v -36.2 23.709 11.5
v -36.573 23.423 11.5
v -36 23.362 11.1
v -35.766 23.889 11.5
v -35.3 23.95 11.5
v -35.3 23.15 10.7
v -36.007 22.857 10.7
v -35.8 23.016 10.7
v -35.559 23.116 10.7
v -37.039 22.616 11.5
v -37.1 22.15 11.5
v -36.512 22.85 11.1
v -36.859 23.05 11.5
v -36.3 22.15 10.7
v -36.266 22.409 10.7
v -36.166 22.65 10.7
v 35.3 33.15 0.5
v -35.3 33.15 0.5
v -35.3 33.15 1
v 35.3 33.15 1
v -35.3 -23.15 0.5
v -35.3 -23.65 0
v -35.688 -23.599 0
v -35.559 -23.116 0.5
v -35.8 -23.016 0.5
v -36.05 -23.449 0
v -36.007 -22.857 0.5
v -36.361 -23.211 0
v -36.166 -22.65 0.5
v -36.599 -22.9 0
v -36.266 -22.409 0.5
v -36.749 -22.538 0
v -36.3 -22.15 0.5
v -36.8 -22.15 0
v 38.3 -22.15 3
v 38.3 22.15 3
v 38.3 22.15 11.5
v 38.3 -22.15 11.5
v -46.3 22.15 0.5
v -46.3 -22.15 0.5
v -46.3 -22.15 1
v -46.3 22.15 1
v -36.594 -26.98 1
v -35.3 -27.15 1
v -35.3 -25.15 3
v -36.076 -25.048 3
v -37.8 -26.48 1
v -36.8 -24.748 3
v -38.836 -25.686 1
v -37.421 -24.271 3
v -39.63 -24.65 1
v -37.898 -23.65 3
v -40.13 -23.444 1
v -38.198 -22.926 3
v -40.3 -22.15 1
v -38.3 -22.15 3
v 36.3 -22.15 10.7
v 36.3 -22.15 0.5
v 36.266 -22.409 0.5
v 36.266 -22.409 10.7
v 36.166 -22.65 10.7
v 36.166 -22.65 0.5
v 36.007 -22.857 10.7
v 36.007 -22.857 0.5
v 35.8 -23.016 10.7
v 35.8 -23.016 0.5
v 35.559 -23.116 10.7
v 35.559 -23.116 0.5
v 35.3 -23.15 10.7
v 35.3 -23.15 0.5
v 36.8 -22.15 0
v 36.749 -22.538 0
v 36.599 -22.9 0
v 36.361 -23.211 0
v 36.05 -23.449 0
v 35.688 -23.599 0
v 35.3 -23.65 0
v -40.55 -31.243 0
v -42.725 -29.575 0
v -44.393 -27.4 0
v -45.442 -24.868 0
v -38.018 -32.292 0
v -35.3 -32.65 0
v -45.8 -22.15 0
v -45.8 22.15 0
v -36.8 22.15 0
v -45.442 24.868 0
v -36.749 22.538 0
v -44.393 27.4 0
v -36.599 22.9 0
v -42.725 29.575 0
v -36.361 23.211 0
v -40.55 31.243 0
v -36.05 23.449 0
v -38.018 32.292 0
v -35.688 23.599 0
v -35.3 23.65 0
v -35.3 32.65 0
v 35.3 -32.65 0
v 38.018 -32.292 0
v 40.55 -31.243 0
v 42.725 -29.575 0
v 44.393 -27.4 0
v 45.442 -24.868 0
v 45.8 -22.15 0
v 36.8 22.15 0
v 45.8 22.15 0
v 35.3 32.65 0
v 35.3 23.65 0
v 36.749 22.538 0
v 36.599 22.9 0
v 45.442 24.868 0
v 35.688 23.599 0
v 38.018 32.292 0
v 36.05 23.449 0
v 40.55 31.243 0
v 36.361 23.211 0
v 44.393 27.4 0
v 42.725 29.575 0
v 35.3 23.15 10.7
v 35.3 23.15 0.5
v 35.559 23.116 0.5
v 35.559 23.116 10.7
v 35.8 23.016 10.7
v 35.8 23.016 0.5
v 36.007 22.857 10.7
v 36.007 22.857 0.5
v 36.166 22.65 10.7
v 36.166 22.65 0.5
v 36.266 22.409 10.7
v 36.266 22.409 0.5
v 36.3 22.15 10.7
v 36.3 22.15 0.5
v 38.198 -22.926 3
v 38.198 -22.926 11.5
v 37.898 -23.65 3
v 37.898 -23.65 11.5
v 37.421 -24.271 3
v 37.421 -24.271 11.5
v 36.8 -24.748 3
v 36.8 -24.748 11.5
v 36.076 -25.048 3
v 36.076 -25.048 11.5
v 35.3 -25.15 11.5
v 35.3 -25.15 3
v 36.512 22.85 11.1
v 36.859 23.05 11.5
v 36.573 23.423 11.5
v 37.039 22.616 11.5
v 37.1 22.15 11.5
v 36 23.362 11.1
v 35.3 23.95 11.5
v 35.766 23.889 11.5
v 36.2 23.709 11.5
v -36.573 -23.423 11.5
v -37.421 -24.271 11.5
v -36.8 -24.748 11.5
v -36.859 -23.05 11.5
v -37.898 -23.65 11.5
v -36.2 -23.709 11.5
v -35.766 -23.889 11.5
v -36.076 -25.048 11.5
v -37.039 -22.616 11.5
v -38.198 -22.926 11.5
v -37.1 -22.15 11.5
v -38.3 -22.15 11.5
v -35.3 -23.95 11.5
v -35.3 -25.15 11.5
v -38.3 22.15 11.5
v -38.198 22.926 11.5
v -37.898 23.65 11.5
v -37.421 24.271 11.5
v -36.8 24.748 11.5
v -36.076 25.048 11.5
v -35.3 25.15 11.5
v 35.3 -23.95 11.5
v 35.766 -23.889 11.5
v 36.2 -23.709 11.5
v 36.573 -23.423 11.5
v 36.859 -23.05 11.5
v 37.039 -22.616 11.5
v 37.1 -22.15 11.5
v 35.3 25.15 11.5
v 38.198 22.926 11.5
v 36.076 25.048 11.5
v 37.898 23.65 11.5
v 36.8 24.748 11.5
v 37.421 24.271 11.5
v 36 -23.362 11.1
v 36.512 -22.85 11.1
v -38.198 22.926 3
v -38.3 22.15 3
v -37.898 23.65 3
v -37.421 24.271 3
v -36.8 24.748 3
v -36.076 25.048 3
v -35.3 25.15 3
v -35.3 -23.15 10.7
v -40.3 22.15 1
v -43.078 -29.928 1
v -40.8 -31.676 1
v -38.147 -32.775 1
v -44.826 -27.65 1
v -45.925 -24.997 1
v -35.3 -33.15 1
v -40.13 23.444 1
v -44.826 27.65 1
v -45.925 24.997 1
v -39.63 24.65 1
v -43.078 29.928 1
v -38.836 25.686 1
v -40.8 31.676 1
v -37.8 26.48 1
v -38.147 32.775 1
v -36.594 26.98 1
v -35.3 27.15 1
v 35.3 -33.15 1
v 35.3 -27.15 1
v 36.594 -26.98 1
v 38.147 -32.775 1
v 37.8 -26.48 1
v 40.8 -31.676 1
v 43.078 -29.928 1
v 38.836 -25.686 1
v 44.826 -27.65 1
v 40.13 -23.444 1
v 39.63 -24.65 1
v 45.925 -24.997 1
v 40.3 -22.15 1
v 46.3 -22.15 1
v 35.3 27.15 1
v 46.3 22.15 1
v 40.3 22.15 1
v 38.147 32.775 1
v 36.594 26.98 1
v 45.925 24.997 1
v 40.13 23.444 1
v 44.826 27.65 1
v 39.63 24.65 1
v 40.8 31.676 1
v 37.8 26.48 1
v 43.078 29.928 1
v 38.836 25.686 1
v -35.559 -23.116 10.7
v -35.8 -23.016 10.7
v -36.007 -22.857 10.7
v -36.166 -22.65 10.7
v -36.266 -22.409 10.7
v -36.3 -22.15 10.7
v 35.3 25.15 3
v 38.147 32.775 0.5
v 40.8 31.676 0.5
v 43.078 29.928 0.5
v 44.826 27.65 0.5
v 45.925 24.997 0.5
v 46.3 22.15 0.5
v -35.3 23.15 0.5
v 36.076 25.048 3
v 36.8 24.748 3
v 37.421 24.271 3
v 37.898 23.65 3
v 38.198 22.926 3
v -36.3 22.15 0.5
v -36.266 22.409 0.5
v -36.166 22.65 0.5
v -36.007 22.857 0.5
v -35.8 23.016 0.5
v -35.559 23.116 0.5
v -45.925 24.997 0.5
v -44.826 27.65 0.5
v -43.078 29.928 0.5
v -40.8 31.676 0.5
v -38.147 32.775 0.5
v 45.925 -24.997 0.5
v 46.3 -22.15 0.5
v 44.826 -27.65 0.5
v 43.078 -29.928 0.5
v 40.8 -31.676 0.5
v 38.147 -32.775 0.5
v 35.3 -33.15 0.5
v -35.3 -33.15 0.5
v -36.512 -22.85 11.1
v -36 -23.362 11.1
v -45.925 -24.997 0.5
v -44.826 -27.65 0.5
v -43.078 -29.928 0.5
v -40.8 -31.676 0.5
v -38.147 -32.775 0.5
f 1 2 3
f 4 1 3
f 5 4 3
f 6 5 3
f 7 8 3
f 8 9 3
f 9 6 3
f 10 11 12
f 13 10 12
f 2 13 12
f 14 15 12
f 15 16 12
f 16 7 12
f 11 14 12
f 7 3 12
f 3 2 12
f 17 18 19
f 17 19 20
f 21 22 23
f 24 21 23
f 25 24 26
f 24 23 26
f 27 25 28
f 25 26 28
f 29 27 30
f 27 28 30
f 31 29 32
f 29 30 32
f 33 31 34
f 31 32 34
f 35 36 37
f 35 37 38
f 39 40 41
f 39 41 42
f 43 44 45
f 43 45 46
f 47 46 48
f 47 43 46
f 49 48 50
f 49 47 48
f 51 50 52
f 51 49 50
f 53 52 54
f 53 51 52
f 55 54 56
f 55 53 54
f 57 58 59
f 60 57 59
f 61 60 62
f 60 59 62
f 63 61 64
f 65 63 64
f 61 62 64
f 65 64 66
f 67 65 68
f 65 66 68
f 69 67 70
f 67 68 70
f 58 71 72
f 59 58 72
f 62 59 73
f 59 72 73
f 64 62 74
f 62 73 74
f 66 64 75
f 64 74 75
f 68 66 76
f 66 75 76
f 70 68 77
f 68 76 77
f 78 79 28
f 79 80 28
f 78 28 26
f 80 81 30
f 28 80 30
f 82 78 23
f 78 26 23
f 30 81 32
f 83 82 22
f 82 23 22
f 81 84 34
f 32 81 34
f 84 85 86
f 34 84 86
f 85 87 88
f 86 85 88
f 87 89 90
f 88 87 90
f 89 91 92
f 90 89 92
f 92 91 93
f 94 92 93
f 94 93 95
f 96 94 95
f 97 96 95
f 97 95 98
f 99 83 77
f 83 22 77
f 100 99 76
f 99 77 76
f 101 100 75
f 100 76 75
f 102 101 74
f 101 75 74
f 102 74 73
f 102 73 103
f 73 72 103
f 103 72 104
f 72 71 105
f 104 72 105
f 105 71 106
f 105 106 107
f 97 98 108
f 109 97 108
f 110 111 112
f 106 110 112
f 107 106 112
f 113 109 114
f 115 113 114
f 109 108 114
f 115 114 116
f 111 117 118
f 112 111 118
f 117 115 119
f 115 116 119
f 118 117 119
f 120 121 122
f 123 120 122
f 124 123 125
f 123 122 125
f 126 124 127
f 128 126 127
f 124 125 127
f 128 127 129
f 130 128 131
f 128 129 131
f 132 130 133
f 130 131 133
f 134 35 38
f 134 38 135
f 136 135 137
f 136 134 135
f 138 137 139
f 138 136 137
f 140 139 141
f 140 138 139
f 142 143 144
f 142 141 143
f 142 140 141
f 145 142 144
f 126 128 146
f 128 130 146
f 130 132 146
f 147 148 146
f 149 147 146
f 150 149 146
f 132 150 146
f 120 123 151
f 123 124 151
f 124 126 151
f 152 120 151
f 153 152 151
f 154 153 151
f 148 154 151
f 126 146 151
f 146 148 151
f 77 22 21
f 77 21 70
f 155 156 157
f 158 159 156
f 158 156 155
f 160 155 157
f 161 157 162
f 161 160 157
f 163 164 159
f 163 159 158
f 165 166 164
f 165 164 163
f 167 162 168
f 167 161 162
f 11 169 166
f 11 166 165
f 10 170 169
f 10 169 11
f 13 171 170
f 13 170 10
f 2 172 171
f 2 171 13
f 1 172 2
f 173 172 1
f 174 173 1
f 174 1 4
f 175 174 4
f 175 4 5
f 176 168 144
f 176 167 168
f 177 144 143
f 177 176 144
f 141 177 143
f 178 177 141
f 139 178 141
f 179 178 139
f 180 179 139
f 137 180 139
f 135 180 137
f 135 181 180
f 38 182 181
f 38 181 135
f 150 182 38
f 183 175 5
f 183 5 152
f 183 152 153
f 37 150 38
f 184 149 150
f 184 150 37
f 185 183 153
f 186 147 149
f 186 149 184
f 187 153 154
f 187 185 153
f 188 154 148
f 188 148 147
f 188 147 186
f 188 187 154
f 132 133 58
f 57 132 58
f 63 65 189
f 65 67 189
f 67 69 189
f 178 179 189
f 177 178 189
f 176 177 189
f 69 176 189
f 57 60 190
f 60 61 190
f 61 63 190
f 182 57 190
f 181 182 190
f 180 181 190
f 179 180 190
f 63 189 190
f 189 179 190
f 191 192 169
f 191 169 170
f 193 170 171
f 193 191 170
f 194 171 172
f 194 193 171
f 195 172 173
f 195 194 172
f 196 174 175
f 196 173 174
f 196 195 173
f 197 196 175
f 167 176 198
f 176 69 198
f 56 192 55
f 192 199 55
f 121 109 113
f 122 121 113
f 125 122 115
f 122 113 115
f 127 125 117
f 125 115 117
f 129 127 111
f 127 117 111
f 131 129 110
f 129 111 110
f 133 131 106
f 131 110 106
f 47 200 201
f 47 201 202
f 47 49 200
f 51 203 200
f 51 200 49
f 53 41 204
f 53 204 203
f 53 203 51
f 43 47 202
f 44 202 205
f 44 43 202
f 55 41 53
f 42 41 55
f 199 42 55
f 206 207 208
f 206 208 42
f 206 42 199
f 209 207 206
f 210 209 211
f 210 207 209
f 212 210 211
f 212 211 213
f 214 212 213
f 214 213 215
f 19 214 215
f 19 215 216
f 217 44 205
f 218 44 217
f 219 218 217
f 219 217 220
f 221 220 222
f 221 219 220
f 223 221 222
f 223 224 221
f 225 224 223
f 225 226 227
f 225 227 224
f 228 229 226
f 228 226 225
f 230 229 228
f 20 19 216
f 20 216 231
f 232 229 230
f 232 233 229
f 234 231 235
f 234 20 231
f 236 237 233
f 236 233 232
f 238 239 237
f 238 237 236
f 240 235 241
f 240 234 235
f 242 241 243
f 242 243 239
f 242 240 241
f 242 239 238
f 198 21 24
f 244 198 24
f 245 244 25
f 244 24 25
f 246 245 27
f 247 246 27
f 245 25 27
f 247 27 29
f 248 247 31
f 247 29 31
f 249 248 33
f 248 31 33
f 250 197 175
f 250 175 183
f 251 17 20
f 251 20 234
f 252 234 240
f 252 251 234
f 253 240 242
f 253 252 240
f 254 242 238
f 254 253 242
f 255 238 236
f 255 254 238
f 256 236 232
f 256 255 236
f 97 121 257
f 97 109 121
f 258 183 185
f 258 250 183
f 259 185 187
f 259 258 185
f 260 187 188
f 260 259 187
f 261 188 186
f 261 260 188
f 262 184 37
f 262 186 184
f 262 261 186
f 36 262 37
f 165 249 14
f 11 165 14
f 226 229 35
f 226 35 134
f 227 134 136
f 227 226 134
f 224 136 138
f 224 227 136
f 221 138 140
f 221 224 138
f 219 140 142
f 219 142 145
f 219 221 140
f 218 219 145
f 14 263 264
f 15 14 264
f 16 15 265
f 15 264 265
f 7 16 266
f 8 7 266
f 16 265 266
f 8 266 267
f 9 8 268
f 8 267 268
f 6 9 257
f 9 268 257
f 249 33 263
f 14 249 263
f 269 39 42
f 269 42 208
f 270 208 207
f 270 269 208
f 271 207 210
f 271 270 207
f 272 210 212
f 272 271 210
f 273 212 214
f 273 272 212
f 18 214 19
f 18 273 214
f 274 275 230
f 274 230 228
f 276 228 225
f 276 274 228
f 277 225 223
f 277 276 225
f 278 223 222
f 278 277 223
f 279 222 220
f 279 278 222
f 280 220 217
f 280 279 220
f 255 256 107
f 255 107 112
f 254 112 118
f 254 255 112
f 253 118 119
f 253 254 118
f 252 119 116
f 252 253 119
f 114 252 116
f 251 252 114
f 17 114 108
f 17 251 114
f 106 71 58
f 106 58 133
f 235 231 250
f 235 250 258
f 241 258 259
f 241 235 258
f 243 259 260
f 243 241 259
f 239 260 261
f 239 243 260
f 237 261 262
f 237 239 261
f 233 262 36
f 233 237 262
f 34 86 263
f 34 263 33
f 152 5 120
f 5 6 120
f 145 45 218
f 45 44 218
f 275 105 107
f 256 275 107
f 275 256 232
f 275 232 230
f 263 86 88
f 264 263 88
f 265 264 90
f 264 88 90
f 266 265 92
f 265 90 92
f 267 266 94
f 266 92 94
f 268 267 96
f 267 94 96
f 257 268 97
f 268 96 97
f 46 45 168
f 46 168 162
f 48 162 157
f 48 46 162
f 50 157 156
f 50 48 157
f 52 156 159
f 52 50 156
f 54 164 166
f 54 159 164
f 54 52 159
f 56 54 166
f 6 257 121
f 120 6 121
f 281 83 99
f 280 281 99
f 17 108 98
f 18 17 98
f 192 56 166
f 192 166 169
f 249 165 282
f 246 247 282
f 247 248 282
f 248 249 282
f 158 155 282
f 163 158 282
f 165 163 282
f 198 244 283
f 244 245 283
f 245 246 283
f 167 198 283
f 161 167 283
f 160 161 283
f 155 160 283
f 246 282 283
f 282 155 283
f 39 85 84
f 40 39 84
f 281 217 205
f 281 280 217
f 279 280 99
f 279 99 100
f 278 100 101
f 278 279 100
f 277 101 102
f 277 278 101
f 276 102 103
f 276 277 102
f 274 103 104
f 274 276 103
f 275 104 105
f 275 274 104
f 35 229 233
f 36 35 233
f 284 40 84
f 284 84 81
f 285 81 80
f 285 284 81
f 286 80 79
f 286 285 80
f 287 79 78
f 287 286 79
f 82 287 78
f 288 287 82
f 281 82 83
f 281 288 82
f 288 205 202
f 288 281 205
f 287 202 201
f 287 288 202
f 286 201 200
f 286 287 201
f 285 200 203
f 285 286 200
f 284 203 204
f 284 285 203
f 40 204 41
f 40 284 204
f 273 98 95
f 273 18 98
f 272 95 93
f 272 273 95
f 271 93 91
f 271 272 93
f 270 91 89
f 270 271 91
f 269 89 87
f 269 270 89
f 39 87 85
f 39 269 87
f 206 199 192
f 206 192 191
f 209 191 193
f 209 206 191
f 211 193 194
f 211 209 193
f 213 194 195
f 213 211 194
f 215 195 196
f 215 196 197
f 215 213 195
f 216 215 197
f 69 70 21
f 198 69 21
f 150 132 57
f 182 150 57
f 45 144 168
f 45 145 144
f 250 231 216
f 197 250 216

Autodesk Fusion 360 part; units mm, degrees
sketch "Sketch1" plane through (0, 0, 0) normal (0, 0, 1) x (1, 0, 0)
  line L0 (36, -22.85) -> (-36, -22.85) construction
  line L1 (-36, -22.85) -> (-36, 22.85) construction
  line L2 (-36, 22.85) -> (36, 22.85) construction
  line L3 (36, 22.85) -> (36, -22.85) construction
  line L4 (36, -22.85) -> (-36, 22.85) construction
  line L5 (-36, -22.85) -> (36, 22.85) construction
  line L6 (35.3, -23.15) -> (-35.3, -23.15)
  line L7 (-36.3, -22.15) -> (-36.3, 22.15)
  line L8 (-35.3, 23.15) -> (35.3, 23.15)
  line L9 (36.3, 22.15) -> (36.3, -22.15)
  arc A0 (-35.3, 23.15) -> (-36.3, 22.15) centre (-35.3, 22.15) ccw
  arc A1 (35.3, -23.15) -> (36.3, -22.15) centre (35.3, -22.15) ccw
  arc A2 (36.3, 22.15) -> (35.3, 23.15) centre (35.3, 22.15) ccw
  arc A3 (-36.3, -22.15) -> (-35.3, -23.15) centre (-35.3, -22.15) ccw
  arc A4 (38.3, 22.15) -> (35.3, 25.15) centre (35.3, 22.15) ccw
  line L10 (-35.3, 25.15) -> (35.3, 25.15)
  arc A5 (-35.3, 25.15) -> (-38.3, 22.15) centre (-35.3, 22.15) ccw
  line L11 (-38.3, -22.15) -> (-38.3, 22.15)
  arc A6 (-38.3, -22.15) -> (-35.3, -25.15) centre (-35.3, -22.15) ccw
  line L12 (35.3, -25.15) -> (-35.3, -25.15)
  arc A7 (35.3, -25.15) -> (38.3, -22.15) centre (35.3, -22.15) ccw
  line L13 (38.3, 22.15) -> (38.3, -22.15)
  arc A8 (46.3, 22.15) -> (35.3, 33.15) centre (35.3, 22.15) ccw
  line L14 (-35.3, 33.15) -> (35.3, 33.15)
  arc A9 (-35.3, 33.15) -> (-46.3, 22.15) centre (-35.3, 22.15) ccw
  line L15 (-46.3, -22.15) -> (-46.3, 22.15)
  arc A10 (-46.3, -22.15) -> (-35.3, -33.15) centre (-35.3, -22.15) ccw
  line L16 (35.3, -33.15) -> (-35.3, -33.15)
  arc A11 (35.3, -33.15) -> (46.3, -22.15) centre (35.3, -22.15) ccw
  line L17 (46.3, 22.15) -> (46.3, -22.15)
  dimension "d3" = 45.7
  dimension "d4" = 72
  dimension "d6" = 1
  dimension "d7" = -2
  dimension "d8" = -10
extrude "Extrude1" add sketch "Sketch1" along normal blind 11.5 contours A4 L10 A5 L11 A6 L12 A7 L13
extrude "Extrude2" add sketch "Sketch1" along normal blind 1 contours A8 L14 A9 L15 A10 L16 A11 L17
chamfer "Chamfer1" distance 0.8 angle 45 8 edges at (0, 23.15, 11.5) (36.0071, 22.8571, 11.5) (36.3, 0, 11.5) (36.0071, -22.8571, 11.5) (0, -23.15, 11.5) (-36.0071, -22.8571, 11.5) (-36.3, 0, 11.5) (-36.0071, 22.8571, 11.5)
chamfer "Chamfer2" distance 2 angle 45 8 edges at (0, 25.15, 1) (-37.4213, 24.2713, 1) (-38.3, 0, 1) (-37.4213, -24.2713, 1) (0, -25.15, 1) (37.4213, -24.2713, 1) (38.3, 0, 1) (37.4213, 24.2713, 1)
chamfer "Chamfer3" distance 0.5 angle 45 16 edges at (0, 33.15, 0) (43.0782, 29.9282, 0) (46.3, 0, 0) (43.0782, -29.9282, 0) (0, -33.15, 0) (-43.0782, -29.9282, 0) (-46.3, 0, 0) (-43.0782, 29.9282, 0) (0, 23.15, 0) (36.0071, 22.8571, 0) (36.3, 0, 0) (36.0071, -22.8571, 0) (0, -23.15, 0) (-36.0071, -22.8571, 0) (-36.3, 0, 0) (-36.0071, 22.8571, 0)
